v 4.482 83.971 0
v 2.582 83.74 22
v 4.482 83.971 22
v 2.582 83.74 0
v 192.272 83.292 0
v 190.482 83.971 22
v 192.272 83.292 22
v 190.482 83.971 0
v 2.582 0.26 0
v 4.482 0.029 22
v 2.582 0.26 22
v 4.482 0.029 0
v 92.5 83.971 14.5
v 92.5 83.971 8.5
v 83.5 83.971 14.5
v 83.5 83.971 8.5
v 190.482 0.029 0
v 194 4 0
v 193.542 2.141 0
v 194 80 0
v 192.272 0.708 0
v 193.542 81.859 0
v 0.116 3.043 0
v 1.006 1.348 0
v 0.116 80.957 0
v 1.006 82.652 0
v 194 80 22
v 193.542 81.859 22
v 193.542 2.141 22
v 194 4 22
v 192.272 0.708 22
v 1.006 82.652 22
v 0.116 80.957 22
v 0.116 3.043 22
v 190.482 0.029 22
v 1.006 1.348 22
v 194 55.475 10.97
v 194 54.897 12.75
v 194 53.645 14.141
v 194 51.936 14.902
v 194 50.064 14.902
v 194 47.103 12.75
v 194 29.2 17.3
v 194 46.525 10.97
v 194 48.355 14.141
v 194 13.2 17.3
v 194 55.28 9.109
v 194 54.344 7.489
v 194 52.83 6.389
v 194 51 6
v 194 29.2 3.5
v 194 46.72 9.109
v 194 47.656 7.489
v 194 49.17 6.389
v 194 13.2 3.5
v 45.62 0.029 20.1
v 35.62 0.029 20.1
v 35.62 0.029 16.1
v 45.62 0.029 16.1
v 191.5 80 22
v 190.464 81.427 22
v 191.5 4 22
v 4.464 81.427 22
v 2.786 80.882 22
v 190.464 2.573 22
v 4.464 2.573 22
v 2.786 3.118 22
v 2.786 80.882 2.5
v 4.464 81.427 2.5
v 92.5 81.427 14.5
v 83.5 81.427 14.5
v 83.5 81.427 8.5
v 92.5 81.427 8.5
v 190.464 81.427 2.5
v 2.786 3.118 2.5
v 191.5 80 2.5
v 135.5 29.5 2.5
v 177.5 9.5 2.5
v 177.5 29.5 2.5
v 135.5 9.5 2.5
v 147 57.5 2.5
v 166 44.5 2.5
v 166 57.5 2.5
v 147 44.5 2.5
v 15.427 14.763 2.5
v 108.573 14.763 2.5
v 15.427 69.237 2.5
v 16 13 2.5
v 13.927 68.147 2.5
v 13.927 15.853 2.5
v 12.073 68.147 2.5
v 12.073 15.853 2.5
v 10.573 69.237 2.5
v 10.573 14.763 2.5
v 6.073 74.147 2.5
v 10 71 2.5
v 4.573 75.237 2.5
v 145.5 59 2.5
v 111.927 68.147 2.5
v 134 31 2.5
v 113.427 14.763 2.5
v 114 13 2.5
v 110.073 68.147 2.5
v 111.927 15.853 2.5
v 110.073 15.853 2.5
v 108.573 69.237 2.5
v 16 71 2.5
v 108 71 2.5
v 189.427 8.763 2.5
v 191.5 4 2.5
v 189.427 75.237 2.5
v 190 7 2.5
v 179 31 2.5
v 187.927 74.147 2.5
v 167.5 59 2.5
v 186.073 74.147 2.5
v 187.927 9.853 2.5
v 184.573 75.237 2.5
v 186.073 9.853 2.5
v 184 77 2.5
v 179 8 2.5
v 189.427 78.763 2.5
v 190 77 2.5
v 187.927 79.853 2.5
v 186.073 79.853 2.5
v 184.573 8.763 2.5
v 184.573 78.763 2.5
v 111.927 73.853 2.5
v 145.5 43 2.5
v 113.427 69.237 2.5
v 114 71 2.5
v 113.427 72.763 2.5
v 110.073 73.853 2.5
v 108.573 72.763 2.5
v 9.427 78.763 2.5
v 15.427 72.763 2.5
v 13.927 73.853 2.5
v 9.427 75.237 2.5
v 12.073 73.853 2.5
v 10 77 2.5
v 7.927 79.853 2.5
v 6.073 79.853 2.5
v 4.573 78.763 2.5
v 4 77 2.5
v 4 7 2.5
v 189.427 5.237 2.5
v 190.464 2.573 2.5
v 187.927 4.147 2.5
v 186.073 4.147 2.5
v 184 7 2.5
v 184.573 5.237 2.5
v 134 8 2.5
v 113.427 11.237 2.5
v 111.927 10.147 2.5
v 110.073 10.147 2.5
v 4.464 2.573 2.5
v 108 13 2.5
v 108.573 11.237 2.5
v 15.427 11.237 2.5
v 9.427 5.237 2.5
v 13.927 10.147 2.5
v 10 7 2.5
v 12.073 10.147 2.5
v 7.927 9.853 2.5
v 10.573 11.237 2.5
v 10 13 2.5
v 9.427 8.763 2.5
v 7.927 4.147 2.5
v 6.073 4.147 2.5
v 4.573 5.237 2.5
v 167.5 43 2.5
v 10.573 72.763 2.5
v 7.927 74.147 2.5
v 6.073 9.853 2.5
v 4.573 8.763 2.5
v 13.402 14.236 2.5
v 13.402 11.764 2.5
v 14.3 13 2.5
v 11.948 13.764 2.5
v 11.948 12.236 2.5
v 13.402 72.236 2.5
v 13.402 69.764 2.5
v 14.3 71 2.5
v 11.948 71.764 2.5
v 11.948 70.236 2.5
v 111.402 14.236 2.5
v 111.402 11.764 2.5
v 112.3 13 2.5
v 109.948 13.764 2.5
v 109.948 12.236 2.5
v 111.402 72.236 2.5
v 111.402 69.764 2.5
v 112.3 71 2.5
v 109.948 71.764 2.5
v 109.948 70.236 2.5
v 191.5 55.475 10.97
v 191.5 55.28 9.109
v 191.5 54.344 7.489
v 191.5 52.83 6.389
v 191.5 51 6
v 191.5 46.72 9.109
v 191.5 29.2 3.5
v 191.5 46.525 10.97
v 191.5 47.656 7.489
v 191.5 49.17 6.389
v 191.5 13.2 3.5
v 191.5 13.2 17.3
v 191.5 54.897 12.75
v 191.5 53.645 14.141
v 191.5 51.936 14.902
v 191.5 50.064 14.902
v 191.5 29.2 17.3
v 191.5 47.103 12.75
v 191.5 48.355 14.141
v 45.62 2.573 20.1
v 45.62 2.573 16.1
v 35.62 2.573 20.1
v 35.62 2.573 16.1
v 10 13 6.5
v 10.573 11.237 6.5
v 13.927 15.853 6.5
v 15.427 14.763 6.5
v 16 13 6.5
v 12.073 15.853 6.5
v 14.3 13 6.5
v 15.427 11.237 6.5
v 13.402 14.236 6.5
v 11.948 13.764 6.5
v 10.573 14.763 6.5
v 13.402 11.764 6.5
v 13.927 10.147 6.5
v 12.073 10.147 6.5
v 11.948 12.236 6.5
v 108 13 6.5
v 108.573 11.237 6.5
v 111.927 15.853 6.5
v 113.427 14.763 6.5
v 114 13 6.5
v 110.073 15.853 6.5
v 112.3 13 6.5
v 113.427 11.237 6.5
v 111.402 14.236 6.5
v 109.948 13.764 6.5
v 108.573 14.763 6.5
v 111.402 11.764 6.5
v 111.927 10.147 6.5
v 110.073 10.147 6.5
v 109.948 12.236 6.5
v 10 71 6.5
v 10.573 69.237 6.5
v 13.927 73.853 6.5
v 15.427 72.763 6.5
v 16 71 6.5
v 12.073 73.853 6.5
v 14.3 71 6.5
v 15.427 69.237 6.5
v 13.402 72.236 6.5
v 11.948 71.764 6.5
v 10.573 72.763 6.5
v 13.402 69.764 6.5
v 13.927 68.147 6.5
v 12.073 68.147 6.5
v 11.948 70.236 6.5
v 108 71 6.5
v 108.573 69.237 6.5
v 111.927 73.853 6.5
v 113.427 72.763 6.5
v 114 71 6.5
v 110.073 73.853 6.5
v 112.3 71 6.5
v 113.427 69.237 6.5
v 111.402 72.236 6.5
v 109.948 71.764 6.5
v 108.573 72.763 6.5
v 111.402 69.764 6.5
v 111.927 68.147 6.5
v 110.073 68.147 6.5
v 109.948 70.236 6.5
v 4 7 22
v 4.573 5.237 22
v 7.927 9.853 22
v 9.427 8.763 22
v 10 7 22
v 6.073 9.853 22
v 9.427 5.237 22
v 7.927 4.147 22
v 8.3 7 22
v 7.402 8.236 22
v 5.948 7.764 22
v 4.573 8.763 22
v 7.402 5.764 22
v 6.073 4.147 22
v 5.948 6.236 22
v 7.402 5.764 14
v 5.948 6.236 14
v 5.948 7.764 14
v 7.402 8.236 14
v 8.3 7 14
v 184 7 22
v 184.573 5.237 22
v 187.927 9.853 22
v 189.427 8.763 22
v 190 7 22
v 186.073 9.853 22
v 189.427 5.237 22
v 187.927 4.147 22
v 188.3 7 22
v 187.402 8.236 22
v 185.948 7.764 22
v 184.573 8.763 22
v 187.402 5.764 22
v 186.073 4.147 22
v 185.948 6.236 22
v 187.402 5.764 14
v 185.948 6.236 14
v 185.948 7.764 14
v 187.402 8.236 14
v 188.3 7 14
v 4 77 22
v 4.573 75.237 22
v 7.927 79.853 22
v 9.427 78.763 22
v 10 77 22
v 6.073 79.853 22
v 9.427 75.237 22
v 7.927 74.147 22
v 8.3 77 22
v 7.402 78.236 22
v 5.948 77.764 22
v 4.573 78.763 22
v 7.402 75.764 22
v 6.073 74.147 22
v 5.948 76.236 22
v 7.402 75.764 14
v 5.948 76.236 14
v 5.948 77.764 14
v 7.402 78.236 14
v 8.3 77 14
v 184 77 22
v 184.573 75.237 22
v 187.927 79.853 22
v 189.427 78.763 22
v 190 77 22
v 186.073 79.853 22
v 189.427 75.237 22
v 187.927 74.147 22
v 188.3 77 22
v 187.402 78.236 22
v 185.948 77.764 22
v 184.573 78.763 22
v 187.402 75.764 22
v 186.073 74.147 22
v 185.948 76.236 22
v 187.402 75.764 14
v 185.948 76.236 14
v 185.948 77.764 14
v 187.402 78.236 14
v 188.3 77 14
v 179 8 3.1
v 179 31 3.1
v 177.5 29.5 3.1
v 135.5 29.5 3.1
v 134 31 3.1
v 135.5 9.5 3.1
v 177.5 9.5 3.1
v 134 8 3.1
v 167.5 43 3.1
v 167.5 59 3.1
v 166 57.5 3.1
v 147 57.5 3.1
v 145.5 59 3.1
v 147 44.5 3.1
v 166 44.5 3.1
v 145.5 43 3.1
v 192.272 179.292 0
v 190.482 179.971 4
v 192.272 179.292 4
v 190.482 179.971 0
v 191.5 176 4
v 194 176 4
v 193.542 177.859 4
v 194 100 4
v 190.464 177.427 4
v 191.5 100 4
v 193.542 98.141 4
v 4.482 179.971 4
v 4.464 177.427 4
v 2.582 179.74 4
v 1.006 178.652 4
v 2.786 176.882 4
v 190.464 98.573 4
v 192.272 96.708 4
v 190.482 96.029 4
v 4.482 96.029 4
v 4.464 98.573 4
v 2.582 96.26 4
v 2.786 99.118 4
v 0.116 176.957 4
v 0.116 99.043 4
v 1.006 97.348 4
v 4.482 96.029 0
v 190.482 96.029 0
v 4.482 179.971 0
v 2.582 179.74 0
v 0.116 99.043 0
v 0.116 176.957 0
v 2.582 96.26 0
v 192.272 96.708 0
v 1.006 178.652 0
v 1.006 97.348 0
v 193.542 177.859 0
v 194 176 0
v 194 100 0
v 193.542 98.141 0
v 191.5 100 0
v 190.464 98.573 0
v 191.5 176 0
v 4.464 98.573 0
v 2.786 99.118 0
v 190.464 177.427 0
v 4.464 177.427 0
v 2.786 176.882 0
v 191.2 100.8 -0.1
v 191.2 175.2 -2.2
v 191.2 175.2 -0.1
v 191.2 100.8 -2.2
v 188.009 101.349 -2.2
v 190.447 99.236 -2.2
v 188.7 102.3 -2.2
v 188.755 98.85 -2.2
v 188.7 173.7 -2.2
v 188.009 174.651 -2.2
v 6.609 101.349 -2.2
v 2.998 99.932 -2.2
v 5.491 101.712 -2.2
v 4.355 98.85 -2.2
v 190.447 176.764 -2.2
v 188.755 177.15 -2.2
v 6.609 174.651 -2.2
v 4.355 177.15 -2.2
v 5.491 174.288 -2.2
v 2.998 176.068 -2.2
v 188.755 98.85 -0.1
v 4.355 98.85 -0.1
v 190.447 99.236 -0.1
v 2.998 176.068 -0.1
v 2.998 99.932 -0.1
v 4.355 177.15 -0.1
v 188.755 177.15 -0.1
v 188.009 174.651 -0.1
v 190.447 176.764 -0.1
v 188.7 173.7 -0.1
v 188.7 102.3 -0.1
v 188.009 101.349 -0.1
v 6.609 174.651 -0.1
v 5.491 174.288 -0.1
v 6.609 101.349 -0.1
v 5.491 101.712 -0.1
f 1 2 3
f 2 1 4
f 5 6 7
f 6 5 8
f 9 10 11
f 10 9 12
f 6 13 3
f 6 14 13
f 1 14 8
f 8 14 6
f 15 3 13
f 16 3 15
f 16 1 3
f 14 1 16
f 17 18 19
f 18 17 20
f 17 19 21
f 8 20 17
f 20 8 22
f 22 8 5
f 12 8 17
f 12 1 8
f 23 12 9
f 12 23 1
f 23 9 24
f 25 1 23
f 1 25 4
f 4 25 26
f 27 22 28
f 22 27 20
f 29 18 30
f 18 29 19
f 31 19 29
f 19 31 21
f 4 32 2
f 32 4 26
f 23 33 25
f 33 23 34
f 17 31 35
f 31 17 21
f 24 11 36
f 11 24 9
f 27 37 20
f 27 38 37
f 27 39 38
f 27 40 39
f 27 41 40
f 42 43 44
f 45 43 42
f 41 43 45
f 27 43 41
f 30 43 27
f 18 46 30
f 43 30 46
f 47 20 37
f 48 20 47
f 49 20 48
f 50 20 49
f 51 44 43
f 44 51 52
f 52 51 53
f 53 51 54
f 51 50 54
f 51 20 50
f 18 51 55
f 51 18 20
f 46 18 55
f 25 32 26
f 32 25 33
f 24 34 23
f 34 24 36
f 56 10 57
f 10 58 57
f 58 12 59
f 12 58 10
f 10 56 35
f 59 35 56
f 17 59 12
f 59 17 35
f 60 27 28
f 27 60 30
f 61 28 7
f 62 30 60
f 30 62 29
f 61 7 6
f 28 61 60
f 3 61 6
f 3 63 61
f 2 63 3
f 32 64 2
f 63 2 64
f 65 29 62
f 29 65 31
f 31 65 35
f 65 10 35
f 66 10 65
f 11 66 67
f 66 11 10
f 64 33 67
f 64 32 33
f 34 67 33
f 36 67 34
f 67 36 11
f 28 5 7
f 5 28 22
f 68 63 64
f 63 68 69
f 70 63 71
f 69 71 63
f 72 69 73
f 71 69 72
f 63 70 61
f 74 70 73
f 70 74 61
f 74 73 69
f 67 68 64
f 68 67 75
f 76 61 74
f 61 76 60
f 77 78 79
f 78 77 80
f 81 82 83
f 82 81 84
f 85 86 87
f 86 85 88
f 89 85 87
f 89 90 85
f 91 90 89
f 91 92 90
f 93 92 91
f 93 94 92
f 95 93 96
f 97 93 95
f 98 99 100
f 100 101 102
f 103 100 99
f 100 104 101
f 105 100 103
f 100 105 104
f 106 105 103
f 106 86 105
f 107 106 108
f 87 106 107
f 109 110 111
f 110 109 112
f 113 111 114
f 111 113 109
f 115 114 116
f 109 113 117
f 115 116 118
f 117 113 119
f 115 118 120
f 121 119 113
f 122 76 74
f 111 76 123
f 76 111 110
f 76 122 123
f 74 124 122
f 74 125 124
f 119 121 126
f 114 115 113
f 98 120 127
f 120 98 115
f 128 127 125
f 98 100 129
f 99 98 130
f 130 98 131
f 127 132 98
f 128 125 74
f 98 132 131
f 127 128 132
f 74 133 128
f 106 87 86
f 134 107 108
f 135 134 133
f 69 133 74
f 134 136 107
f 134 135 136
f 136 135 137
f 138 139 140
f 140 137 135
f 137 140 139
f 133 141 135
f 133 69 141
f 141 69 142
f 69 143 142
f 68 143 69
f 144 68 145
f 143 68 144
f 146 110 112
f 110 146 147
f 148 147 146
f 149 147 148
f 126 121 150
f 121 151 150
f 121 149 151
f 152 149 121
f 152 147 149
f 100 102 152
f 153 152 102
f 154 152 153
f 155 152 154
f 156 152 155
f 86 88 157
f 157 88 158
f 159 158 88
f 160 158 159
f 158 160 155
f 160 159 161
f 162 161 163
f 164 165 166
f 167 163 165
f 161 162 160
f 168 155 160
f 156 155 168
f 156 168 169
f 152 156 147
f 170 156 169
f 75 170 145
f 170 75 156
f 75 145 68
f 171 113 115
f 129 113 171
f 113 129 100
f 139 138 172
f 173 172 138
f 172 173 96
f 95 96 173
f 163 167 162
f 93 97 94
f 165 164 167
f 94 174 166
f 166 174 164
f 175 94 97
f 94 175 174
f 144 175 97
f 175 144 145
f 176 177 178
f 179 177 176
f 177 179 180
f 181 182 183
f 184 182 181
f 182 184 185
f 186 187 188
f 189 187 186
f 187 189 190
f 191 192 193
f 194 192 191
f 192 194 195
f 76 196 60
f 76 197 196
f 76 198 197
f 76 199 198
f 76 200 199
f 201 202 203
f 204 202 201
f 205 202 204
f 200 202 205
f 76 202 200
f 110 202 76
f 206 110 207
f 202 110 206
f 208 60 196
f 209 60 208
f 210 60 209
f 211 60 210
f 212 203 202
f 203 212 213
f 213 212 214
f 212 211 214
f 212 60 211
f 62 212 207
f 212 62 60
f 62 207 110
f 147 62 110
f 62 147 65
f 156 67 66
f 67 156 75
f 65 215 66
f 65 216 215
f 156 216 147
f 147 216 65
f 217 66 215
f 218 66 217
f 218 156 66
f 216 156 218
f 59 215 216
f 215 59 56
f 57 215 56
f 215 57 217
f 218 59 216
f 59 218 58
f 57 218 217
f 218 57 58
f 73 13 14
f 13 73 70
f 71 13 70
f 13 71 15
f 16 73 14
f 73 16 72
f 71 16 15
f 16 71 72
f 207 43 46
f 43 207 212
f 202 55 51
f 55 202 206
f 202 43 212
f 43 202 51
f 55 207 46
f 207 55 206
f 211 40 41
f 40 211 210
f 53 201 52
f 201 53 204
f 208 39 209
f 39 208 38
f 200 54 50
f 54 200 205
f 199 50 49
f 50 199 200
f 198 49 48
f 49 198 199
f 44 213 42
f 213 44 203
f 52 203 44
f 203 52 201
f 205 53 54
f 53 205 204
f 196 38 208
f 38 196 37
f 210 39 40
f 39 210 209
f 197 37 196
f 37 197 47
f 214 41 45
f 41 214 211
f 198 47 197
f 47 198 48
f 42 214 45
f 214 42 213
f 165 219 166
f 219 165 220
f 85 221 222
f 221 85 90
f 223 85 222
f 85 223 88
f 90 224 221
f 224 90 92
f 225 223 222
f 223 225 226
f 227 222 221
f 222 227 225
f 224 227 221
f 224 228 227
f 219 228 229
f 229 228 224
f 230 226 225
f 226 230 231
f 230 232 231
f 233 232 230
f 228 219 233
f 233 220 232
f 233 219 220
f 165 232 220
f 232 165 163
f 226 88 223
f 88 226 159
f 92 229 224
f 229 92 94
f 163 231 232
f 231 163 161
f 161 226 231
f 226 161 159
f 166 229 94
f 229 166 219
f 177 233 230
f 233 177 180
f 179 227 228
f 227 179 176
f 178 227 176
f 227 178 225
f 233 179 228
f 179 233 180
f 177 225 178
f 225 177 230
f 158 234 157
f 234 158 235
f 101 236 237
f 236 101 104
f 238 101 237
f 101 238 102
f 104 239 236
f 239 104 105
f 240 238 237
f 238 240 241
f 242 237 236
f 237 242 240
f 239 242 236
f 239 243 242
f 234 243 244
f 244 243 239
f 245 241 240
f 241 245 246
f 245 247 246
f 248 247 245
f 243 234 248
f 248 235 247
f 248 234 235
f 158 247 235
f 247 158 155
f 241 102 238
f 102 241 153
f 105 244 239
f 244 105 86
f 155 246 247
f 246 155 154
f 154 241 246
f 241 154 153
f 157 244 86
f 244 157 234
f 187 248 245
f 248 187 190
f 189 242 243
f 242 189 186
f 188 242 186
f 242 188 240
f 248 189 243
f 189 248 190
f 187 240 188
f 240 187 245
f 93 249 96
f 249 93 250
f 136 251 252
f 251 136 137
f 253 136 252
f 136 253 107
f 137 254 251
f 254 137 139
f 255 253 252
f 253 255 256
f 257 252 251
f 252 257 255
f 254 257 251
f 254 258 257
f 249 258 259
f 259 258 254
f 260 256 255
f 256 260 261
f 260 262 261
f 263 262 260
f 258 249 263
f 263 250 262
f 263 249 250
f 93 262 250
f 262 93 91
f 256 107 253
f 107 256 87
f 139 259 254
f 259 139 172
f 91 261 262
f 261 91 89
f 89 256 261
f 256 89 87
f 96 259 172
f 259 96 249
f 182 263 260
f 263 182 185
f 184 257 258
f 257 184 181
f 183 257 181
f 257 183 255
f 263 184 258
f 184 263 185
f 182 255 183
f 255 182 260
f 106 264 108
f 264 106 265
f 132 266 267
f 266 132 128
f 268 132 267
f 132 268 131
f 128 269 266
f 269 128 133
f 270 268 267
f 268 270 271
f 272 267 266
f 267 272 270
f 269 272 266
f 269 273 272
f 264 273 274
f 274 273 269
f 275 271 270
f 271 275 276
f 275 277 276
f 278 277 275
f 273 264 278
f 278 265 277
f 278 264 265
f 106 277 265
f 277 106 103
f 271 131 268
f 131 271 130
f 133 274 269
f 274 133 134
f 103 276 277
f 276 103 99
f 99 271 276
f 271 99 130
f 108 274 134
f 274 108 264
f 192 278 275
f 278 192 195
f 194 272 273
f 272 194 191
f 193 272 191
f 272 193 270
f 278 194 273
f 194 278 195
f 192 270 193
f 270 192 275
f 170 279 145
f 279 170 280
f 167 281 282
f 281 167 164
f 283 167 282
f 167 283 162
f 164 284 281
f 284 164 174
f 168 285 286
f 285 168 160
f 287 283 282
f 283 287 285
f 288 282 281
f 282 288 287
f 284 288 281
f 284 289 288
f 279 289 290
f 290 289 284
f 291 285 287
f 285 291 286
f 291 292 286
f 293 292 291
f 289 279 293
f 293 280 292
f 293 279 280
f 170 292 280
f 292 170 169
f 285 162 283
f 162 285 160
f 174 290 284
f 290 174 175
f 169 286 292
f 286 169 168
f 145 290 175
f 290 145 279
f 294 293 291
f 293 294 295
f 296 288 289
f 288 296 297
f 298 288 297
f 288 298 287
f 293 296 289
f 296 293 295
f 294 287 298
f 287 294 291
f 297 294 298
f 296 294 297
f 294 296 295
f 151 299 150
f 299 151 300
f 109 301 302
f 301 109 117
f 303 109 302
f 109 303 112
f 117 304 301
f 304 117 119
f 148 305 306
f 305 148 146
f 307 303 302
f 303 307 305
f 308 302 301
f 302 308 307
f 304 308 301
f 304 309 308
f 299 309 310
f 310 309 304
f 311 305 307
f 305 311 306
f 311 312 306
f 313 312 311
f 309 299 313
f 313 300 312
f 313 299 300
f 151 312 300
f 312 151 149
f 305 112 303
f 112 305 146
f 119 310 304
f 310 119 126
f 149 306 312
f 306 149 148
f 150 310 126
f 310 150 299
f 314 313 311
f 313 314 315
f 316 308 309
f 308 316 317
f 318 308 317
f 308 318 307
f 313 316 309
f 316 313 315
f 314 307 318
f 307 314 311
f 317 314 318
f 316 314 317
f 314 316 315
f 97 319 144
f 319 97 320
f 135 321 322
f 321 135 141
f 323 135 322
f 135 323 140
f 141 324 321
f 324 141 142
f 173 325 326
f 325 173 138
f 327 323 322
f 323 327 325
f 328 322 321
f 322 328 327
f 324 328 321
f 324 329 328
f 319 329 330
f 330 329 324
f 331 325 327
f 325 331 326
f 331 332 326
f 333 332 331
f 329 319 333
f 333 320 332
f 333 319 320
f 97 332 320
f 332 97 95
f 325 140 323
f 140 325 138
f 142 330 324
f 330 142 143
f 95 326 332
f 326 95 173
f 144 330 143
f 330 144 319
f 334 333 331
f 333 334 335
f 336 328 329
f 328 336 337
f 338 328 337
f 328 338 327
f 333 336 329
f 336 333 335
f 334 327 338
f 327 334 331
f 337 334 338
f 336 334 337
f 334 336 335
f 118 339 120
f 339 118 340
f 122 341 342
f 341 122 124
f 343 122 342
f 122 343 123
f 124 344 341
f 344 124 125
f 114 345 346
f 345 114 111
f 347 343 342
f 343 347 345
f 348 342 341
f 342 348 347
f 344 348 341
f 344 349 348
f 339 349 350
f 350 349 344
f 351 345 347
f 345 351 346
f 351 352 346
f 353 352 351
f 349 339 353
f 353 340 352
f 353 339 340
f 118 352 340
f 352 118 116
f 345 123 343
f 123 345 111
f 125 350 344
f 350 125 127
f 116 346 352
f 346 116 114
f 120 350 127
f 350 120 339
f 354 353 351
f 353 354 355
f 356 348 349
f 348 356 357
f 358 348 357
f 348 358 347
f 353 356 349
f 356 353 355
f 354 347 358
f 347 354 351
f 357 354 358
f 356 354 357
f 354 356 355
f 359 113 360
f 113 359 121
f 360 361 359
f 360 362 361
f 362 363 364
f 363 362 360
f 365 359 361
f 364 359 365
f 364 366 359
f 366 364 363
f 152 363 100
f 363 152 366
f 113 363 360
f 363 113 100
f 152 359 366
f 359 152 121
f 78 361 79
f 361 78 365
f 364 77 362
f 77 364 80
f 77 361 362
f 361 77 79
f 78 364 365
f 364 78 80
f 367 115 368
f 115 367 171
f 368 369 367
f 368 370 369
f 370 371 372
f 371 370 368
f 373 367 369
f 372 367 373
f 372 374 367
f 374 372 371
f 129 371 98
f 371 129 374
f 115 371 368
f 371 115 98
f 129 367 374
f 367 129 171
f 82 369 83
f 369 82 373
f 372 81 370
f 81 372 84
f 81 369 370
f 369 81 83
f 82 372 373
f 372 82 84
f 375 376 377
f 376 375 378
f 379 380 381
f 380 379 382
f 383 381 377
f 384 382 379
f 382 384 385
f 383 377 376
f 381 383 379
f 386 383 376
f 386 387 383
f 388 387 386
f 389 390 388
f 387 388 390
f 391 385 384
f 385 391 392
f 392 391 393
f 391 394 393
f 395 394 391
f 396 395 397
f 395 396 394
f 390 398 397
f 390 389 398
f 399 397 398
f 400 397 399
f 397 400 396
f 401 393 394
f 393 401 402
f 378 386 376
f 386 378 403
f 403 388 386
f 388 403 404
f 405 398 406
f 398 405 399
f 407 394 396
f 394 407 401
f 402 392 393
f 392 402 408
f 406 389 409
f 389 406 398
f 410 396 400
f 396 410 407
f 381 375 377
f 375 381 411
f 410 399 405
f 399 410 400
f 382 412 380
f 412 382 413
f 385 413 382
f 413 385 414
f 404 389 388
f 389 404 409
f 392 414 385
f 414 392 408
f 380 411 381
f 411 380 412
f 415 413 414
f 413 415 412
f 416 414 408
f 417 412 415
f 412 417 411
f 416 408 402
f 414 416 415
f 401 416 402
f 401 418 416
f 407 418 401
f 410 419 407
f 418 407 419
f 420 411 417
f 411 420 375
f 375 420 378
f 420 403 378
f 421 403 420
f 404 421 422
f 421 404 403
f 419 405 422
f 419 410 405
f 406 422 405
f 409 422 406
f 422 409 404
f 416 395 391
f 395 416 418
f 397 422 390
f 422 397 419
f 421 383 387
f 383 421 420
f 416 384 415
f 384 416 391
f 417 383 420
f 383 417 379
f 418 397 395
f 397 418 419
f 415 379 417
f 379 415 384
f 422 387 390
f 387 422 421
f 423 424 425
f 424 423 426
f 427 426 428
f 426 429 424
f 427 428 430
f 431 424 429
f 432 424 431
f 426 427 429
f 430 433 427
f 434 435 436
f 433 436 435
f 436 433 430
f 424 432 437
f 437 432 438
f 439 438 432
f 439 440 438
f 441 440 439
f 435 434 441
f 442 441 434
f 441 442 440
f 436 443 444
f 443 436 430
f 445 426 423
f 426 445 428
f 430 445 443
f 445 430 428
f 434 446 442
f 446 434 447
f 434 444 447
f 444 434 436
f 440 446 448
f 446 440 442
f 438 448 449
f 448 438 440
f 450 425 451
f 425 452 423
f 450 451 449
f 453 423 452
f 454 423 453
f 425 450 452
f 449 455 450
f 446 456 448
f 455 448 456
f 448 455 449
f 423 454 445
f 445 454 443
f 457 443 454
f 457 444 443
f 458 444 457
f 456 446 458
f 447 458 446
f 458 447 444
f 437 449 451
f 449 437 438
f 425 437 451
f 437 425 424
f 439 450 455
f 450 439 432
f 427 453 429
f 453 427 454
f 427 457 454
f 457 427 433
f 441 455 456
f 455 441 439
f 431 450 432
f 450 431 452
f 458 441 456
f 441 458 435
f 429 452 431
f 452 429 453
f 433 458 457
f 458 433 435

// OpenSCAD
// ============================================================
// MAIN BOARD ENCLOSURE
// Houses: the main PCB (Nano soldered directly to it, driver header,
// power-in header, pendant header), plus the buck converter and
// DRV8825 stepper driver modules mounted in a side bay. Powered
// through a panel-mount Anderson Powerpole pair. Separate wall
// openings for the pendant cable and the stepper motor leads.
// ============================================================

// ============= PARAMETERS (edit to match your parts) =============

wall = 2.5;
corner_r = 4;

// --- Main PCB (from main_copper_reference.svg / pcb_build_guide.md) ---
// 108 x 68mm board, 4 corner mounting holes at local (5,5), (103,5),
// (5,63), (103,63).
pcb_w = 108;
pcb_d = 68;
pcb_margin = 8;
pcb_hole_dia = 3.2;
pcb_standoff_od = 6;
pcb_standoff_h = 4;

box_w_pcb_section = pcb_w + 2*pcb_margin;   // width of just the PCB half of the box
box_d = pcb_d + 2*pcb_margin;
pcb_offset_x = pcb_margin;
pcb_offset_y = pcb_margin;

// --- Component bay: buck converter + DRV8825, beside the PCB ---
// Both are adhesive/hot-glue mounted onto a shallow printed placement
// outline rather than screw standoffs, since hole spacing on these
// cheap breakout modules varies a lot between suppliers — measure
// yours if you'd rather drill matching standoff holes instead.
bay_w = 70;
buck_w = 45; buck_h = 23; buck_outline_depth = 0.6;
buck_x0 = box_w_pcb_section + 10;
buck_y0 = 8;
drv_w = 22; drv_h = 16;
drv_x0 = box_w_pcb_section + 10 + (buck_w - drv_w)/2;
drv_y0 = buck_y0 + buck_h + 12;

box_w = box_w_pcb_section + bay_w;   // overall box width

box_h_base = 22;    // clears the buck converter's ~14mm height, and also the
                     // Nano sitting on female header sockets (~13mm stack:
                     // 8.5mm socket + Nano PCB + tallest topside component)
box_h_lid  = 4;

// --- Corner posts ---
post_inset = 7;      // kept clear of the PCB standoffs (~8.5mm away)
post_od = 6;
post_pilot_d = 2.6;
post_pilot_depth = 8;
post_positions = [
  [post_inset, post_inset],
  [box_w - post_inset, post_inset],
  [post_inset, box_d - post_inset],
  [box_w - post_inset, box_d - post_inset],
];

// --- Nano USB cutout, back wall (y = 0) ---
// The Nano's footprint on the PCB spans local x=25..40.24. MEASURE
// YOUR CLONE — USB position/orientation varies by supplier.
// Height assumes the Nano sits on female header sockets (see
// pcb_build_guide.md), which raise it well above the main PCB
// surface — 8.5mm socket + Nano PCB thickness + roughly half the USB
// connector's own height. If you're soldering a bare Nano flat to the
// board instead, lower usb_z_center to about wall + pcb_standoff_h + 3.
usb_cutout_w = 10;
usb_cutout_h = 4;
usb_center_x = pcb_offset_x + (25 + 40.24)/2;
usb_z_center = wall + pcb_standoff_h + 8.5 + 1.6 + 1.5;

// --- Pendant cable exit, front wall (y = box_d), under the pendant header ---
pend_slot_w = 9;
pend_slot_h = 6;
pend_slot_z = wall + pcb_standoff_h + 2;
pend_slot_x = pcb_offset_x + 80;   // pendant header's board-local x

// --- Anderson Powerpole panel cutout (input power), far wall (x = box_w) ---
// Sized for a standard 2-pole gang, red+black housings dovetailed and
// stacked vertically (the usual PP15/30/45 convention) — roughly
// 16mm wide x 17mm tall x 20mm deep. Cut a bit generous and
// friction-fit the housing, or add a dab of hot glue; the printed lip
// on 3 sides gives it something to grip against. File/sand to fit
// your specific housing.
pp_w = 16;    // width of the opening, along the wall (y-axis)
pp_h = 15;    // height of the opening, vertical (z-axis)
pp_cy = buck_y0 + buck_h/2;   // centered on the buck converter, along the wall's y-axis
pp_z  = wall + 1;
pp_lip = 1.2;

// --- Stepper motor wire exit, far wall (x = box_w), below the Powerpole cutout ---
motor_hole_d = 9;
motor_cy = drv_y0 + drv_h/2;
motor_z  = wall + 8;

// ============= MODULES =============

module rounded_box(w, d, h, r) {
  hull() {
    for (x = [r, w - r])
      for (y = [r, d - r])
        translate([x, y, 0])
          cylinder(h = h, r = r);
  }
}

module base() {
  difference() {
    rounded_box(box_w, box_d, box_h_base, corner_r);

    translate([wall, wall, wall])
      rounded_box(box_w - 2*wall, box_d - 2*wall, box_h_base, max(corner_r - wall, 0.1));

    translate([usb_center_x - usb_cutout_w/2, -1, usb_z_center - usb_cutout_h/2])
      cube([usb_cutout_w, wall + 2, usb_cutout_h]);

    translate([pend_slot_x - pend_slot_w/2, box_d - wall - 1, pend_slot_z])
      cube([pend_slot_w, wall + 2, pend_slot_h]);

    translate([box_w - wall - 1, pp_cy - pp_h/2 + pp_lip, pp_z])
      cube([wall + 2, pp_w, pp_h - pp_lip]);

    translate([box_w - wall - 1, motor_cy, motor_z])
      rotate([0,90,0])
        cylinder(h = wall + 2, d = motor_hole_d);
  }

  // PCB standoffs, matched to the board's own verified-clear corner holes
  pcb_hole_positions = [
    [pcb_offset_x + 5,   pcb_offset_y + 5],
    [pcb_offset_x + 103, pcb_offset_y + 5],
    [pcb_offset_x + 5,   pcb_offset_y + 63],
    [pcb_offset_x + 103, pcb_offset_y + 63],
  ];
  for (p = pcb_hole_positions) {
    translate([p[0], p[1], wall])
      difference() {
        cylinder(h = pcb_standoff_h, d = pcb_standoff_od);
        cylinder(h = pcb_standoff_h + 1, d = pcb_hole_dia - 0.6);
      }
  }

  // Corner posts
  for (p = post_positions) {
    translate([p[0], p[1], wall])
      difference() {
        cylinder(h = box_h_base - wall, d = post_od);
        translate([0, 0, (box_h_base - wall) - post_pilot_depth])
          cylinder(h = post_pilot_depth + 1, d = post_pilot_d);
      }
  }

  // Buck converter placement outline — a shallow raised border so the
  // module sits in a known, repeatable spot before gluing it down
  translate([buck_x0, buck_y0, wall])
    difference() {
      cube([buck_w, buck_h, buck_outline_depth]);
      translate([1.5, 1.5, -0.5])
        cube([buck_w - 3, buck_h - 3, buck_outline_depth + 1]);
    }

  // DRV8825 placement outline, same approach
  translate([drv_x0, drv_y0, wall])
    difference() {
      cube([drv_w, drv_h, buck_outline_depth]);
      translate([1.5, 1.5, -0.5])
        cube([drv_w - 3, drv_h - 3, buck_outline_depth + 1]);
    }
}

module lid() {
  difference() {
    rounded_box(box_w, box_d, box_h_lid, corner_r);
    translate([wall, wall, -1])
      rounded_box(box_w - 2*wall, box_d - 2*wall, box_h_lid + 2, max(corner_r - wall, 0.1));
    for (p = post_positions) {
      translate([p[0], p[1], -1])
        cylinder(h = box_h_lid + 2, d = 3.2);
    }
  }
  translate([wall + 0.3, wall + 0.3, -2.2])
    difference() {
      rounded_box(box_w - 2*wall - 0.6, box_d - 2*wall - 0.6, 2.1, 2);
      translate([wall, wall, -1])
        rounded_box(box_w - 4*wall - 0.6, box_d - 4*wall - 0.6, 4.1, 1);
    }
}

// ============= LAYOUT FOR PRINTING =============
base();
translate([0, box_d + 12, 0])
  lid();
